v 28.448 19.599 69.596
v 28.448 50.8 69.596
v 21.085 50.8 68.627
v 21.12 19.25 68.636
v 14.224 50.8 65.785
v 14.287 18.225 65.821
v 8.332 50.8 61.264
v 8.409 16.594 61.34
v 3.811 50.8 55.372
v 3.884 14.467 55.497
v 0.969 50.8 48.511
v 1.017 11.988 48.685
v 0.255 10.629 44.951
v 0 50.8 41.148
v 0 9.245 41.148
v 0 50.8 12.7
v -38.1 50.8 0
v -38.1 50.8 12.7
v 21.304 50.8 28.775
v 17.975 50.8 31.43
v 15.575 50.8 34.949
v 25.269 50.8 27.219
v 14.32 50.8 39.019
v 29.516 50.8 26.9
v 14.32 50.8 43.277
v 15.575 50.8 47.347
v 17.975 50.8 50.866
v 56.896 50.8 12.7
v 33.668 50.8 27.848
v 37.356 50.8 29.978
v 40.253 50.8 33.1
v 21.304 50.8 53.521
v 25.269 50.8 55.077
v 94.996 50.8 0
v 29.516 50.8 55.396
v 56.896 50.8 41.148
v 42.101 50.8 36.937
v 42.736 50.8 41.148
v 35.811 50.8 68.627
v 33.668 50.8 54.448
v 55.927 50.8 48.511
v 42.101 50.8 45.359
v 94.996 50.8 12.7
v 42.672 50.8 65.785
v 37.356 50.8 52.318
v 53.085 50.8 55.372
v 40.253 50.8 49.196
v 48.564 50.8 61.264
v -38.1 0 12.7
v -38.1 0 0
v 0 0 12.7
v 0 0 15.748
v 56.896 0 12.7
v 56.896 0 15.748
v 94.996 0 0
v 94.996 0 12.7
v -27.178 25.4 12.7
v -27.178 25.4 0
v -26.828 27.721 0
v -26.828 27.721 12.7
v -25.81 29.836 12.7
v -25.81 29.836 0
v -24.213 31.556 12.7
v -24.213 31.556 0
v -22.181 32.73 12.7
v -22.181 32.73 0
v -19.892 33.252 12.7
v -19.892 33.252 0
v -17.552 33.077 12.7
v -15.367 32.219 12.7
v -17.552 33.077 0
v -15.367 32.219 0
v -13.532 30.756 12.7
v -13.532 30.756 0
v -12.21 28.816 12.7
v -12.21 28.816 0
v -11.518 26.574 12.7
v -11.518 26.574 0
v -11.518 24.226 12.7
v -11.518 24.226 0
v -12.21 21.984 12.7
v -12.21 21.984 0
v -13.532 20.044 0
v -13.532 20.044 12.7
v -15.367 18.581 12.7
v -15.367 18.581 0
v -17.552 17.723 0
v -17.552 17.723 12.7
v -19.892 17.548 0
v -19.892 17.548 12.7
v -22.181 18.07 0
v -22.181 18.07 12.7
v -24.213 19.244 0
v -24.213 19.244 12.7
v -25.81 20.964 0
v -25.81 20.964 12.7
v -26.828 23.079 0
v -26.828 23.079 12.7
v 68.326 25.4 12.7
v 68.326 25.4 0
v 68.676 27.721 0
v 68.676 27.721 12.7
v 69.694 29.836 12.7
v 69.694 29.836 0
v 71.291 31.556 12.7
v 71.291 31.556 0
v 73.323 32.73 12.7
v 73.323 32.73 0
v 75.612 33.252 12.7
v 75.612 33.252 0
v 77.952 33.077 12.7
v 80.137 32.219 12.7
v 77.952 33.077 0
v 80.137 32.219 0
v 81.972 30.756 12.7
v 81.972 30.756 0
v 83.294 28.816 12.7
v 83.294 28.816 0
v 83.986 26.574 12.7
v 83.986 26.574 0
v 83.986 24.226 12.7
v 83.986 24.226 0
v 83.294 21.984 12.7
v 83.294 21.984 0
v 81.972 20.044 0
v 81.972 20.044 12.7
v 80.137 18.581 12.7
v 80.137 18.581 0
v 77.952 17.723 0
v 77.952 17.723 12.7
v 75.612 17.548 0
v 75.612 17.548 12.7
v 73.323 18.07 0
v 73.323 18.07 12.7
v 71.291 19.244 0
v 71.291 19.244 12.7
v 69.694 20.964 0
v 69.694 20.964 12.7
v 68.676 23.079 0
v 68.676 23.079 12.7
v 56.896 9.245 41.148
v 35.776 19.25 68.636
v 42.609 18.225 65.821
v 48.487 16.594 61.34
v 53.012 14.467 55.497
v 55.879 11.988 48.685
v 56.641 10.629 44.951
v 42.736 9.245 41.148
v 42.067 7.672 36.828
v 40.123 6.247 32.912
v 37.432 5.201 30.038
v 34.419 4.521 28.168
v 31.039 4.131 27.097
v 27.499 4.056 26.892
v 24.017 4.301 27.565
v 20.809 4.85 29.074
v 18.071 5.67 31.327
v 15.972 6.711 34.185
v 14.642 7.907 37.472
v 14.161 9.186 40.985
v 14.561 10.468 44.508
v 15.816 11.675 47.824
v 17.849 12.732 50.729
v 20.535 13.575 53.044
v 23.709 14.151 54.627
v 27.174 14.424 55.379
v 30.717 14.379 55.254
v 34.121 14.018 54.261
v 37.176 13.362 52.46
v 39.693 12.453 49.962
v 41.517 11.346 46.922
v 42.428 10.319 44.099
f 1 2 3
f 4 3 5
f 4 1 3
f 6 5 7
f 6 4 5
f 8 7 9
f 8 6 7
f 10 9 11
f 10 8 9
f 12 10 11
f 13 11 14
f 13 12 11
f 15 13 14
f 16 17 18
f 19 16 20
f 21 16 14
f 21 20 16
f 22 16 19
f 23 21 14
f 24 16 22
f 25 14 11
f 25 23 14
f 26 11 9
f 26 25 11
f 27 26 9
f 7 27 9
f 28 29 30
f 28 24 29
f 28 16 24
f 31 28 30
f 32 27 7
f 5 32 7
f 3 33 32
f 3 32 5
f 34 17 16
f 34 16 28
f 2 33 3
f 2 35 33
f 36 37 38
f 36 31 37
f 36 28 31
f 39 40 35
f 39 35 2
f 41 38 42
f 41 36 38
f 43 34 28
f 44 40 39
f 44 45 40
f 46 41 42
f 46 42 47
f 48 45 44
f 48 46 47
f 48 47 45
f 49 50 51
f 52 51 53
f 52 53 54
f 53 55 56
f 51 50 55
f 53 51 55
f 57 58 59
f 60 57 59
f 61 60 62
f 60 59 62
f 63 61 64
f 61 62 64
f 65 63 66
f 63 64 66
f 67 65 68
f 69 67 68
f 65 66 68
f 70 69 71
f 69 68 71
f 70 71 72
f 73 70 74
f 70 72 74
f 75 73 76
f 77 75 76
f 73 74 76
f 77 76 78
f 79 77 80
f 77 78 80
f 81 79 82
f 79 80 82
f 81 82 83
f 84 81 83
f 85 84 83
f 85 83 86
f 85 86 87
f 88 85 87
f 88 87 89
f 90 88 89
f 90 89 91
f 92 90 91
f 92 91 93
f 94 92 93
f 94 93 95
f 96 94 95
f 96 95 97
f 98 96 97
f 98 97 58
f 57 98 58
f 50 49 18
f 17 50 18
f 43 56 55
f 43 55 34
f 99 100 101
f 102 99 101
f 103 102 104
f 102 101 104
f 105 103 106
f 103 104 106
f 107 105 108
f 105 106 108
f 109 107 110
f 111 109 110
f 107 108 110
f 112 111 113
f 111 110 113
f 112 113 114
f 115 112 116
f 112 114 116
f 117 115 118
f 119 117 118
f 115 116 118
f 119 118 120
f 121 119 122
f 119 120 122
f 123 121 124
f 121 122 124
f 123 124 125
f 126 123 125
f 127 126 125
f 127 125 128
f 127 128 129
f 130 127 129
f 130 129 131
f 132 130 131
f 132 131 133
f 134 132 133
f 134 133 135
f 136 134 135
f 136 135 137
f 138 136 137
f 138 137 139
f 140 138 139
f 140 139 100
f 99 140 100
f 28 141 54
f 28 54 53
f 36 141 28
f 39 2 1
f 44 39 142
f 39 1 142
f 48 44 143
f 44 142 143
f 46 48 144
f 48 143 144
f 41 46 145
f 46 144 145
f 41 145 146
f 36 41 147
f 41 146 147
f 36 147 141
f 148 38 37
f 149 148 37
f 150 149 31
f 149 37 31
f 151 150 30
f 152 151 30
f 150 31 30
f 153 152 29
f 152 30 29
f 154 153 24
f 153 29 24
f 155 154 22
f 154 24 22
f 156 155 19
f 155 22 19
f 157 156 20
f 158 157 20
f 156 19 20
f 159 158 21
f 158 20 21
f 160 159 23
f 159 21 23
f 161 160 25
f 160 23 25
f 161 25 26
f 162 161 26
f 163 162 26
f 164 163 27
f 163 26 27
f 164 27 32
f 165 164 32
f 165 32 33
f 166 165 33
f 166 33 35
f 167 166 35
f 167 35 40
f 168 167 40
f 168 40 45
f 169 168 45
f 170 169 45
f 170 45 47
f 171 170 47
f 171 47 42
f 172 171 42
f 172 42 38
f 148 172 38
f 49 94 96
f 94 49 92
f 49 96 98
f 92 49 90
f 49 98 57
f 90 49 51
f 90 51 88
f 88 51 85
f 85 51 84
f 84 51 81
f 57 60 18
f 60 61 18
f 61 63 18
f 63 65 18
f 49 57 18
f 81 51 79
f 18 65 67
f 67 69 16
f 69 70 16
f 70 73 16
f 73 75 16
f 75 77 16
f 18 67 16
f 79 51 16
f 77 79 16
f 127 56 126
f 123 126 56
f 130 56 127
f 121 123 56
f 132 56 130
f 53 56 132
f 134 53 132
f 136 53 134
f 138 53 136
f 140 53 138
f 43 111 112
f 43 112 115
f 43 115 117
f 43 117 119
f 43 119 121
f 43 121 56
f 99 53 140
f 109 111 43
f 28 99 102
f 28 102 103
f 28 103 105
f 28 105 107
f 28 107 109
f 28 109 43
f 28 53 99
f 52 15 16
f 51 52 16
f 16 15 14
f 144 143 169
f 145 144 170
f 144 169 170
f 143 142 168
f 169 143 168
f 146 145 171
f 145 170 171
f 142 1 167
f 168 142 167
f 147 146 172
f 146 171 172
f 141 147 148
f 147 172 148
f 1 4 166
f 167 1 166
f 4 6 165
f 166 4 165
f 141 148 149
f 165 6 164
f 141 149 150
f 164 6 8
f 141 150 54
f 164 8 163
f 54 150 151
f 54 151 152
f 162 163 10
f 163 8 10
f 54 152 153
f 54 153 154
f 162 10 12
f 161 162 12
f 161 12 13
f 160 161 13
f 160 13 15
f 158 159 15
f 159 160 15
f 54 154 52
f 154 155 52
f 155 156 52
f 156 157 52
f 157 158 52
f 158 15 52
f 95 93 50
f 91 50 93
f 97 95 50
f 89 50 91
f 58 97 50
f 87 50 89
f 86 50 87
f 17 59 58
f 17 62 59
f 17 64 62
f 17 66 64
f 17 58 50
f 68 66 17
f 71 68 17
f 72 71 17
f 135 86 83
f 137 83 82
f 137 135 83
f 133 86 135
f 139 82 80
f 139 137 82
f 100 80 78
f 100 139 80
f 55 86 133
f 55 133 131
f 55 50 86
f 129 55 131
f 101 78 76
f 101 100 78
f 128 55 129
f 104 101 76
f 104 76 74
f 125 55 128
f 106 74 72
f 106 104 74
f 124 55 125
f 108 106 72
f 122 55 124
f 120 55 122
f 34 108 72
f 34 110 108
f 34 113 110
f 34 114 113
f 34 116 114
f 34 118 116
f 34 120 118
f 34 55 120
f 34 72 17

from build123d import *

# Parameters (mm, degrees)
F0_W     = 50.8
F0_H     = 12.7
F0_H_2   = 3.048
F1_DEPTH = 56.896
F2_DEPTH = 94.996
F3_DEPTH = 38.1
F4_R     = 28.44799
F6_DEPTH = 51.054
F8_DEPTH = 42.418


# Not quite as in the source:
# - a fillet or chamfer is up to 0.001 mm smaller than in the source, because OpenCascade refuses the exact size


with BuildPart() as f1:
    # F0 (on Right) → F1 (new body)
    with BuildSketch(Plane.YZ):
        with Locations((25.4, 6.35)):
            Rectangle(F0_W, F0_H)
        Polygon((19.5990691748, 69.596), (0, 15.748), (50.8, 15.748), (50.8, 69.596), align=None)
        with Locations((25.4, 14.224)):
            Rectangle(F0_W, F0_H_2)
    extrude(amount=F1_DEPTH)

    # F0 (on Right) → F2 (join)
    with BuildSketch(Plane.YZ):
        with Locations((25.4, 6.35)):
            Rectangle(F0_W, F0_H)
    extrude(amount=F2_DEPTH)

    # F0 (on Right) → F3 (join)
    with BuildSketch(Plane.YZ):
        with Locations((25.4, 6.35)):
            Rectangle(F0_W, F0_H)
    extrude(amount=-F3_DEPTH)

    # F4 (radius 28.448 in the source; OpenCascade refuses exactly that, so slightly less here)
    f4_edges = [f1.edges().sort_by_distance(p)[0] for p in [
        (0, 35.199535, 69.596),
        (56.896, 35.199535, 69.596),
    ]]
    fillet(f4_edges, radius=F4_R)

    # F5 (on face) → F6 (cut)
    with BuildSketch(Plane(origin=(0, 50.8, 0), x_dir=(-1, 0, 0), z_dir=(0, 1, 0))):
        with BuildLine():
            ThreePointArc((-14.1605, 41.148), (-28.448, 55.4355), (-42.7355, 41.148))
            Line((-42.7355, 41.148), (-14.1605, 41.148))
        make_face()
        with BuildLine():
            Line((-14.1605, 41.148), (-42.7355, 41.148))
            ThreePointArc((-42.7355, 41.148), (-28.448, 26.8605), (-14.1605, 41.148))
        make_face()
    extrude(amount=-F6_DEPTH, mode=Mode.SUBTRACT)

    # F7 (on face) → F8 (cut)
    with BuildSketch(Plane(origin=(0, 0, 0), x_dir=(1, 0, 0), z_dir=(0, 0, -1))):
        with BuildLine():
            ThreePointArc((-11.43, -25.4), (-19.304, -17.526), (-27.178, -25.4))
            Line((-27.178, -25.4), (-19.304, -25.4))
            Line((-19.304, -25.4), (-11.43, -25.4))
        make_face()
        with BuildLine():
            ThreePointArc((84.074, -25.4), (76.2, -17.526), (68.326, -25.4))
            Line((68.326, -25.4), (76.2, -25.4))
            Line((76.2, -25.4), (84.074, -25.4))
        make_face()
        with BuildLine():
            Line((76.2, -25.4), (68.326, -25.4))
            ThreePointArc((68.326, -25.4), (76.2, -33.274), (84.074, -25.4))
            Line((84.074, -25.4), (76.2, -25.4))
        make_face()
        with BuildLine():
            Line((-19.304, -25.4), (-27.178, -25.4))
            ThreePointArc((-27.178, -25.4), (-19.304, -33.274), (-11.43, -25.4))
            Line((-11.43, -25.4), (-19.304, -25.4))
        make_face()
    extrude(amount=-F8_DEPTH, mode=Mode.SUBTRACT)


solid = f1.part
